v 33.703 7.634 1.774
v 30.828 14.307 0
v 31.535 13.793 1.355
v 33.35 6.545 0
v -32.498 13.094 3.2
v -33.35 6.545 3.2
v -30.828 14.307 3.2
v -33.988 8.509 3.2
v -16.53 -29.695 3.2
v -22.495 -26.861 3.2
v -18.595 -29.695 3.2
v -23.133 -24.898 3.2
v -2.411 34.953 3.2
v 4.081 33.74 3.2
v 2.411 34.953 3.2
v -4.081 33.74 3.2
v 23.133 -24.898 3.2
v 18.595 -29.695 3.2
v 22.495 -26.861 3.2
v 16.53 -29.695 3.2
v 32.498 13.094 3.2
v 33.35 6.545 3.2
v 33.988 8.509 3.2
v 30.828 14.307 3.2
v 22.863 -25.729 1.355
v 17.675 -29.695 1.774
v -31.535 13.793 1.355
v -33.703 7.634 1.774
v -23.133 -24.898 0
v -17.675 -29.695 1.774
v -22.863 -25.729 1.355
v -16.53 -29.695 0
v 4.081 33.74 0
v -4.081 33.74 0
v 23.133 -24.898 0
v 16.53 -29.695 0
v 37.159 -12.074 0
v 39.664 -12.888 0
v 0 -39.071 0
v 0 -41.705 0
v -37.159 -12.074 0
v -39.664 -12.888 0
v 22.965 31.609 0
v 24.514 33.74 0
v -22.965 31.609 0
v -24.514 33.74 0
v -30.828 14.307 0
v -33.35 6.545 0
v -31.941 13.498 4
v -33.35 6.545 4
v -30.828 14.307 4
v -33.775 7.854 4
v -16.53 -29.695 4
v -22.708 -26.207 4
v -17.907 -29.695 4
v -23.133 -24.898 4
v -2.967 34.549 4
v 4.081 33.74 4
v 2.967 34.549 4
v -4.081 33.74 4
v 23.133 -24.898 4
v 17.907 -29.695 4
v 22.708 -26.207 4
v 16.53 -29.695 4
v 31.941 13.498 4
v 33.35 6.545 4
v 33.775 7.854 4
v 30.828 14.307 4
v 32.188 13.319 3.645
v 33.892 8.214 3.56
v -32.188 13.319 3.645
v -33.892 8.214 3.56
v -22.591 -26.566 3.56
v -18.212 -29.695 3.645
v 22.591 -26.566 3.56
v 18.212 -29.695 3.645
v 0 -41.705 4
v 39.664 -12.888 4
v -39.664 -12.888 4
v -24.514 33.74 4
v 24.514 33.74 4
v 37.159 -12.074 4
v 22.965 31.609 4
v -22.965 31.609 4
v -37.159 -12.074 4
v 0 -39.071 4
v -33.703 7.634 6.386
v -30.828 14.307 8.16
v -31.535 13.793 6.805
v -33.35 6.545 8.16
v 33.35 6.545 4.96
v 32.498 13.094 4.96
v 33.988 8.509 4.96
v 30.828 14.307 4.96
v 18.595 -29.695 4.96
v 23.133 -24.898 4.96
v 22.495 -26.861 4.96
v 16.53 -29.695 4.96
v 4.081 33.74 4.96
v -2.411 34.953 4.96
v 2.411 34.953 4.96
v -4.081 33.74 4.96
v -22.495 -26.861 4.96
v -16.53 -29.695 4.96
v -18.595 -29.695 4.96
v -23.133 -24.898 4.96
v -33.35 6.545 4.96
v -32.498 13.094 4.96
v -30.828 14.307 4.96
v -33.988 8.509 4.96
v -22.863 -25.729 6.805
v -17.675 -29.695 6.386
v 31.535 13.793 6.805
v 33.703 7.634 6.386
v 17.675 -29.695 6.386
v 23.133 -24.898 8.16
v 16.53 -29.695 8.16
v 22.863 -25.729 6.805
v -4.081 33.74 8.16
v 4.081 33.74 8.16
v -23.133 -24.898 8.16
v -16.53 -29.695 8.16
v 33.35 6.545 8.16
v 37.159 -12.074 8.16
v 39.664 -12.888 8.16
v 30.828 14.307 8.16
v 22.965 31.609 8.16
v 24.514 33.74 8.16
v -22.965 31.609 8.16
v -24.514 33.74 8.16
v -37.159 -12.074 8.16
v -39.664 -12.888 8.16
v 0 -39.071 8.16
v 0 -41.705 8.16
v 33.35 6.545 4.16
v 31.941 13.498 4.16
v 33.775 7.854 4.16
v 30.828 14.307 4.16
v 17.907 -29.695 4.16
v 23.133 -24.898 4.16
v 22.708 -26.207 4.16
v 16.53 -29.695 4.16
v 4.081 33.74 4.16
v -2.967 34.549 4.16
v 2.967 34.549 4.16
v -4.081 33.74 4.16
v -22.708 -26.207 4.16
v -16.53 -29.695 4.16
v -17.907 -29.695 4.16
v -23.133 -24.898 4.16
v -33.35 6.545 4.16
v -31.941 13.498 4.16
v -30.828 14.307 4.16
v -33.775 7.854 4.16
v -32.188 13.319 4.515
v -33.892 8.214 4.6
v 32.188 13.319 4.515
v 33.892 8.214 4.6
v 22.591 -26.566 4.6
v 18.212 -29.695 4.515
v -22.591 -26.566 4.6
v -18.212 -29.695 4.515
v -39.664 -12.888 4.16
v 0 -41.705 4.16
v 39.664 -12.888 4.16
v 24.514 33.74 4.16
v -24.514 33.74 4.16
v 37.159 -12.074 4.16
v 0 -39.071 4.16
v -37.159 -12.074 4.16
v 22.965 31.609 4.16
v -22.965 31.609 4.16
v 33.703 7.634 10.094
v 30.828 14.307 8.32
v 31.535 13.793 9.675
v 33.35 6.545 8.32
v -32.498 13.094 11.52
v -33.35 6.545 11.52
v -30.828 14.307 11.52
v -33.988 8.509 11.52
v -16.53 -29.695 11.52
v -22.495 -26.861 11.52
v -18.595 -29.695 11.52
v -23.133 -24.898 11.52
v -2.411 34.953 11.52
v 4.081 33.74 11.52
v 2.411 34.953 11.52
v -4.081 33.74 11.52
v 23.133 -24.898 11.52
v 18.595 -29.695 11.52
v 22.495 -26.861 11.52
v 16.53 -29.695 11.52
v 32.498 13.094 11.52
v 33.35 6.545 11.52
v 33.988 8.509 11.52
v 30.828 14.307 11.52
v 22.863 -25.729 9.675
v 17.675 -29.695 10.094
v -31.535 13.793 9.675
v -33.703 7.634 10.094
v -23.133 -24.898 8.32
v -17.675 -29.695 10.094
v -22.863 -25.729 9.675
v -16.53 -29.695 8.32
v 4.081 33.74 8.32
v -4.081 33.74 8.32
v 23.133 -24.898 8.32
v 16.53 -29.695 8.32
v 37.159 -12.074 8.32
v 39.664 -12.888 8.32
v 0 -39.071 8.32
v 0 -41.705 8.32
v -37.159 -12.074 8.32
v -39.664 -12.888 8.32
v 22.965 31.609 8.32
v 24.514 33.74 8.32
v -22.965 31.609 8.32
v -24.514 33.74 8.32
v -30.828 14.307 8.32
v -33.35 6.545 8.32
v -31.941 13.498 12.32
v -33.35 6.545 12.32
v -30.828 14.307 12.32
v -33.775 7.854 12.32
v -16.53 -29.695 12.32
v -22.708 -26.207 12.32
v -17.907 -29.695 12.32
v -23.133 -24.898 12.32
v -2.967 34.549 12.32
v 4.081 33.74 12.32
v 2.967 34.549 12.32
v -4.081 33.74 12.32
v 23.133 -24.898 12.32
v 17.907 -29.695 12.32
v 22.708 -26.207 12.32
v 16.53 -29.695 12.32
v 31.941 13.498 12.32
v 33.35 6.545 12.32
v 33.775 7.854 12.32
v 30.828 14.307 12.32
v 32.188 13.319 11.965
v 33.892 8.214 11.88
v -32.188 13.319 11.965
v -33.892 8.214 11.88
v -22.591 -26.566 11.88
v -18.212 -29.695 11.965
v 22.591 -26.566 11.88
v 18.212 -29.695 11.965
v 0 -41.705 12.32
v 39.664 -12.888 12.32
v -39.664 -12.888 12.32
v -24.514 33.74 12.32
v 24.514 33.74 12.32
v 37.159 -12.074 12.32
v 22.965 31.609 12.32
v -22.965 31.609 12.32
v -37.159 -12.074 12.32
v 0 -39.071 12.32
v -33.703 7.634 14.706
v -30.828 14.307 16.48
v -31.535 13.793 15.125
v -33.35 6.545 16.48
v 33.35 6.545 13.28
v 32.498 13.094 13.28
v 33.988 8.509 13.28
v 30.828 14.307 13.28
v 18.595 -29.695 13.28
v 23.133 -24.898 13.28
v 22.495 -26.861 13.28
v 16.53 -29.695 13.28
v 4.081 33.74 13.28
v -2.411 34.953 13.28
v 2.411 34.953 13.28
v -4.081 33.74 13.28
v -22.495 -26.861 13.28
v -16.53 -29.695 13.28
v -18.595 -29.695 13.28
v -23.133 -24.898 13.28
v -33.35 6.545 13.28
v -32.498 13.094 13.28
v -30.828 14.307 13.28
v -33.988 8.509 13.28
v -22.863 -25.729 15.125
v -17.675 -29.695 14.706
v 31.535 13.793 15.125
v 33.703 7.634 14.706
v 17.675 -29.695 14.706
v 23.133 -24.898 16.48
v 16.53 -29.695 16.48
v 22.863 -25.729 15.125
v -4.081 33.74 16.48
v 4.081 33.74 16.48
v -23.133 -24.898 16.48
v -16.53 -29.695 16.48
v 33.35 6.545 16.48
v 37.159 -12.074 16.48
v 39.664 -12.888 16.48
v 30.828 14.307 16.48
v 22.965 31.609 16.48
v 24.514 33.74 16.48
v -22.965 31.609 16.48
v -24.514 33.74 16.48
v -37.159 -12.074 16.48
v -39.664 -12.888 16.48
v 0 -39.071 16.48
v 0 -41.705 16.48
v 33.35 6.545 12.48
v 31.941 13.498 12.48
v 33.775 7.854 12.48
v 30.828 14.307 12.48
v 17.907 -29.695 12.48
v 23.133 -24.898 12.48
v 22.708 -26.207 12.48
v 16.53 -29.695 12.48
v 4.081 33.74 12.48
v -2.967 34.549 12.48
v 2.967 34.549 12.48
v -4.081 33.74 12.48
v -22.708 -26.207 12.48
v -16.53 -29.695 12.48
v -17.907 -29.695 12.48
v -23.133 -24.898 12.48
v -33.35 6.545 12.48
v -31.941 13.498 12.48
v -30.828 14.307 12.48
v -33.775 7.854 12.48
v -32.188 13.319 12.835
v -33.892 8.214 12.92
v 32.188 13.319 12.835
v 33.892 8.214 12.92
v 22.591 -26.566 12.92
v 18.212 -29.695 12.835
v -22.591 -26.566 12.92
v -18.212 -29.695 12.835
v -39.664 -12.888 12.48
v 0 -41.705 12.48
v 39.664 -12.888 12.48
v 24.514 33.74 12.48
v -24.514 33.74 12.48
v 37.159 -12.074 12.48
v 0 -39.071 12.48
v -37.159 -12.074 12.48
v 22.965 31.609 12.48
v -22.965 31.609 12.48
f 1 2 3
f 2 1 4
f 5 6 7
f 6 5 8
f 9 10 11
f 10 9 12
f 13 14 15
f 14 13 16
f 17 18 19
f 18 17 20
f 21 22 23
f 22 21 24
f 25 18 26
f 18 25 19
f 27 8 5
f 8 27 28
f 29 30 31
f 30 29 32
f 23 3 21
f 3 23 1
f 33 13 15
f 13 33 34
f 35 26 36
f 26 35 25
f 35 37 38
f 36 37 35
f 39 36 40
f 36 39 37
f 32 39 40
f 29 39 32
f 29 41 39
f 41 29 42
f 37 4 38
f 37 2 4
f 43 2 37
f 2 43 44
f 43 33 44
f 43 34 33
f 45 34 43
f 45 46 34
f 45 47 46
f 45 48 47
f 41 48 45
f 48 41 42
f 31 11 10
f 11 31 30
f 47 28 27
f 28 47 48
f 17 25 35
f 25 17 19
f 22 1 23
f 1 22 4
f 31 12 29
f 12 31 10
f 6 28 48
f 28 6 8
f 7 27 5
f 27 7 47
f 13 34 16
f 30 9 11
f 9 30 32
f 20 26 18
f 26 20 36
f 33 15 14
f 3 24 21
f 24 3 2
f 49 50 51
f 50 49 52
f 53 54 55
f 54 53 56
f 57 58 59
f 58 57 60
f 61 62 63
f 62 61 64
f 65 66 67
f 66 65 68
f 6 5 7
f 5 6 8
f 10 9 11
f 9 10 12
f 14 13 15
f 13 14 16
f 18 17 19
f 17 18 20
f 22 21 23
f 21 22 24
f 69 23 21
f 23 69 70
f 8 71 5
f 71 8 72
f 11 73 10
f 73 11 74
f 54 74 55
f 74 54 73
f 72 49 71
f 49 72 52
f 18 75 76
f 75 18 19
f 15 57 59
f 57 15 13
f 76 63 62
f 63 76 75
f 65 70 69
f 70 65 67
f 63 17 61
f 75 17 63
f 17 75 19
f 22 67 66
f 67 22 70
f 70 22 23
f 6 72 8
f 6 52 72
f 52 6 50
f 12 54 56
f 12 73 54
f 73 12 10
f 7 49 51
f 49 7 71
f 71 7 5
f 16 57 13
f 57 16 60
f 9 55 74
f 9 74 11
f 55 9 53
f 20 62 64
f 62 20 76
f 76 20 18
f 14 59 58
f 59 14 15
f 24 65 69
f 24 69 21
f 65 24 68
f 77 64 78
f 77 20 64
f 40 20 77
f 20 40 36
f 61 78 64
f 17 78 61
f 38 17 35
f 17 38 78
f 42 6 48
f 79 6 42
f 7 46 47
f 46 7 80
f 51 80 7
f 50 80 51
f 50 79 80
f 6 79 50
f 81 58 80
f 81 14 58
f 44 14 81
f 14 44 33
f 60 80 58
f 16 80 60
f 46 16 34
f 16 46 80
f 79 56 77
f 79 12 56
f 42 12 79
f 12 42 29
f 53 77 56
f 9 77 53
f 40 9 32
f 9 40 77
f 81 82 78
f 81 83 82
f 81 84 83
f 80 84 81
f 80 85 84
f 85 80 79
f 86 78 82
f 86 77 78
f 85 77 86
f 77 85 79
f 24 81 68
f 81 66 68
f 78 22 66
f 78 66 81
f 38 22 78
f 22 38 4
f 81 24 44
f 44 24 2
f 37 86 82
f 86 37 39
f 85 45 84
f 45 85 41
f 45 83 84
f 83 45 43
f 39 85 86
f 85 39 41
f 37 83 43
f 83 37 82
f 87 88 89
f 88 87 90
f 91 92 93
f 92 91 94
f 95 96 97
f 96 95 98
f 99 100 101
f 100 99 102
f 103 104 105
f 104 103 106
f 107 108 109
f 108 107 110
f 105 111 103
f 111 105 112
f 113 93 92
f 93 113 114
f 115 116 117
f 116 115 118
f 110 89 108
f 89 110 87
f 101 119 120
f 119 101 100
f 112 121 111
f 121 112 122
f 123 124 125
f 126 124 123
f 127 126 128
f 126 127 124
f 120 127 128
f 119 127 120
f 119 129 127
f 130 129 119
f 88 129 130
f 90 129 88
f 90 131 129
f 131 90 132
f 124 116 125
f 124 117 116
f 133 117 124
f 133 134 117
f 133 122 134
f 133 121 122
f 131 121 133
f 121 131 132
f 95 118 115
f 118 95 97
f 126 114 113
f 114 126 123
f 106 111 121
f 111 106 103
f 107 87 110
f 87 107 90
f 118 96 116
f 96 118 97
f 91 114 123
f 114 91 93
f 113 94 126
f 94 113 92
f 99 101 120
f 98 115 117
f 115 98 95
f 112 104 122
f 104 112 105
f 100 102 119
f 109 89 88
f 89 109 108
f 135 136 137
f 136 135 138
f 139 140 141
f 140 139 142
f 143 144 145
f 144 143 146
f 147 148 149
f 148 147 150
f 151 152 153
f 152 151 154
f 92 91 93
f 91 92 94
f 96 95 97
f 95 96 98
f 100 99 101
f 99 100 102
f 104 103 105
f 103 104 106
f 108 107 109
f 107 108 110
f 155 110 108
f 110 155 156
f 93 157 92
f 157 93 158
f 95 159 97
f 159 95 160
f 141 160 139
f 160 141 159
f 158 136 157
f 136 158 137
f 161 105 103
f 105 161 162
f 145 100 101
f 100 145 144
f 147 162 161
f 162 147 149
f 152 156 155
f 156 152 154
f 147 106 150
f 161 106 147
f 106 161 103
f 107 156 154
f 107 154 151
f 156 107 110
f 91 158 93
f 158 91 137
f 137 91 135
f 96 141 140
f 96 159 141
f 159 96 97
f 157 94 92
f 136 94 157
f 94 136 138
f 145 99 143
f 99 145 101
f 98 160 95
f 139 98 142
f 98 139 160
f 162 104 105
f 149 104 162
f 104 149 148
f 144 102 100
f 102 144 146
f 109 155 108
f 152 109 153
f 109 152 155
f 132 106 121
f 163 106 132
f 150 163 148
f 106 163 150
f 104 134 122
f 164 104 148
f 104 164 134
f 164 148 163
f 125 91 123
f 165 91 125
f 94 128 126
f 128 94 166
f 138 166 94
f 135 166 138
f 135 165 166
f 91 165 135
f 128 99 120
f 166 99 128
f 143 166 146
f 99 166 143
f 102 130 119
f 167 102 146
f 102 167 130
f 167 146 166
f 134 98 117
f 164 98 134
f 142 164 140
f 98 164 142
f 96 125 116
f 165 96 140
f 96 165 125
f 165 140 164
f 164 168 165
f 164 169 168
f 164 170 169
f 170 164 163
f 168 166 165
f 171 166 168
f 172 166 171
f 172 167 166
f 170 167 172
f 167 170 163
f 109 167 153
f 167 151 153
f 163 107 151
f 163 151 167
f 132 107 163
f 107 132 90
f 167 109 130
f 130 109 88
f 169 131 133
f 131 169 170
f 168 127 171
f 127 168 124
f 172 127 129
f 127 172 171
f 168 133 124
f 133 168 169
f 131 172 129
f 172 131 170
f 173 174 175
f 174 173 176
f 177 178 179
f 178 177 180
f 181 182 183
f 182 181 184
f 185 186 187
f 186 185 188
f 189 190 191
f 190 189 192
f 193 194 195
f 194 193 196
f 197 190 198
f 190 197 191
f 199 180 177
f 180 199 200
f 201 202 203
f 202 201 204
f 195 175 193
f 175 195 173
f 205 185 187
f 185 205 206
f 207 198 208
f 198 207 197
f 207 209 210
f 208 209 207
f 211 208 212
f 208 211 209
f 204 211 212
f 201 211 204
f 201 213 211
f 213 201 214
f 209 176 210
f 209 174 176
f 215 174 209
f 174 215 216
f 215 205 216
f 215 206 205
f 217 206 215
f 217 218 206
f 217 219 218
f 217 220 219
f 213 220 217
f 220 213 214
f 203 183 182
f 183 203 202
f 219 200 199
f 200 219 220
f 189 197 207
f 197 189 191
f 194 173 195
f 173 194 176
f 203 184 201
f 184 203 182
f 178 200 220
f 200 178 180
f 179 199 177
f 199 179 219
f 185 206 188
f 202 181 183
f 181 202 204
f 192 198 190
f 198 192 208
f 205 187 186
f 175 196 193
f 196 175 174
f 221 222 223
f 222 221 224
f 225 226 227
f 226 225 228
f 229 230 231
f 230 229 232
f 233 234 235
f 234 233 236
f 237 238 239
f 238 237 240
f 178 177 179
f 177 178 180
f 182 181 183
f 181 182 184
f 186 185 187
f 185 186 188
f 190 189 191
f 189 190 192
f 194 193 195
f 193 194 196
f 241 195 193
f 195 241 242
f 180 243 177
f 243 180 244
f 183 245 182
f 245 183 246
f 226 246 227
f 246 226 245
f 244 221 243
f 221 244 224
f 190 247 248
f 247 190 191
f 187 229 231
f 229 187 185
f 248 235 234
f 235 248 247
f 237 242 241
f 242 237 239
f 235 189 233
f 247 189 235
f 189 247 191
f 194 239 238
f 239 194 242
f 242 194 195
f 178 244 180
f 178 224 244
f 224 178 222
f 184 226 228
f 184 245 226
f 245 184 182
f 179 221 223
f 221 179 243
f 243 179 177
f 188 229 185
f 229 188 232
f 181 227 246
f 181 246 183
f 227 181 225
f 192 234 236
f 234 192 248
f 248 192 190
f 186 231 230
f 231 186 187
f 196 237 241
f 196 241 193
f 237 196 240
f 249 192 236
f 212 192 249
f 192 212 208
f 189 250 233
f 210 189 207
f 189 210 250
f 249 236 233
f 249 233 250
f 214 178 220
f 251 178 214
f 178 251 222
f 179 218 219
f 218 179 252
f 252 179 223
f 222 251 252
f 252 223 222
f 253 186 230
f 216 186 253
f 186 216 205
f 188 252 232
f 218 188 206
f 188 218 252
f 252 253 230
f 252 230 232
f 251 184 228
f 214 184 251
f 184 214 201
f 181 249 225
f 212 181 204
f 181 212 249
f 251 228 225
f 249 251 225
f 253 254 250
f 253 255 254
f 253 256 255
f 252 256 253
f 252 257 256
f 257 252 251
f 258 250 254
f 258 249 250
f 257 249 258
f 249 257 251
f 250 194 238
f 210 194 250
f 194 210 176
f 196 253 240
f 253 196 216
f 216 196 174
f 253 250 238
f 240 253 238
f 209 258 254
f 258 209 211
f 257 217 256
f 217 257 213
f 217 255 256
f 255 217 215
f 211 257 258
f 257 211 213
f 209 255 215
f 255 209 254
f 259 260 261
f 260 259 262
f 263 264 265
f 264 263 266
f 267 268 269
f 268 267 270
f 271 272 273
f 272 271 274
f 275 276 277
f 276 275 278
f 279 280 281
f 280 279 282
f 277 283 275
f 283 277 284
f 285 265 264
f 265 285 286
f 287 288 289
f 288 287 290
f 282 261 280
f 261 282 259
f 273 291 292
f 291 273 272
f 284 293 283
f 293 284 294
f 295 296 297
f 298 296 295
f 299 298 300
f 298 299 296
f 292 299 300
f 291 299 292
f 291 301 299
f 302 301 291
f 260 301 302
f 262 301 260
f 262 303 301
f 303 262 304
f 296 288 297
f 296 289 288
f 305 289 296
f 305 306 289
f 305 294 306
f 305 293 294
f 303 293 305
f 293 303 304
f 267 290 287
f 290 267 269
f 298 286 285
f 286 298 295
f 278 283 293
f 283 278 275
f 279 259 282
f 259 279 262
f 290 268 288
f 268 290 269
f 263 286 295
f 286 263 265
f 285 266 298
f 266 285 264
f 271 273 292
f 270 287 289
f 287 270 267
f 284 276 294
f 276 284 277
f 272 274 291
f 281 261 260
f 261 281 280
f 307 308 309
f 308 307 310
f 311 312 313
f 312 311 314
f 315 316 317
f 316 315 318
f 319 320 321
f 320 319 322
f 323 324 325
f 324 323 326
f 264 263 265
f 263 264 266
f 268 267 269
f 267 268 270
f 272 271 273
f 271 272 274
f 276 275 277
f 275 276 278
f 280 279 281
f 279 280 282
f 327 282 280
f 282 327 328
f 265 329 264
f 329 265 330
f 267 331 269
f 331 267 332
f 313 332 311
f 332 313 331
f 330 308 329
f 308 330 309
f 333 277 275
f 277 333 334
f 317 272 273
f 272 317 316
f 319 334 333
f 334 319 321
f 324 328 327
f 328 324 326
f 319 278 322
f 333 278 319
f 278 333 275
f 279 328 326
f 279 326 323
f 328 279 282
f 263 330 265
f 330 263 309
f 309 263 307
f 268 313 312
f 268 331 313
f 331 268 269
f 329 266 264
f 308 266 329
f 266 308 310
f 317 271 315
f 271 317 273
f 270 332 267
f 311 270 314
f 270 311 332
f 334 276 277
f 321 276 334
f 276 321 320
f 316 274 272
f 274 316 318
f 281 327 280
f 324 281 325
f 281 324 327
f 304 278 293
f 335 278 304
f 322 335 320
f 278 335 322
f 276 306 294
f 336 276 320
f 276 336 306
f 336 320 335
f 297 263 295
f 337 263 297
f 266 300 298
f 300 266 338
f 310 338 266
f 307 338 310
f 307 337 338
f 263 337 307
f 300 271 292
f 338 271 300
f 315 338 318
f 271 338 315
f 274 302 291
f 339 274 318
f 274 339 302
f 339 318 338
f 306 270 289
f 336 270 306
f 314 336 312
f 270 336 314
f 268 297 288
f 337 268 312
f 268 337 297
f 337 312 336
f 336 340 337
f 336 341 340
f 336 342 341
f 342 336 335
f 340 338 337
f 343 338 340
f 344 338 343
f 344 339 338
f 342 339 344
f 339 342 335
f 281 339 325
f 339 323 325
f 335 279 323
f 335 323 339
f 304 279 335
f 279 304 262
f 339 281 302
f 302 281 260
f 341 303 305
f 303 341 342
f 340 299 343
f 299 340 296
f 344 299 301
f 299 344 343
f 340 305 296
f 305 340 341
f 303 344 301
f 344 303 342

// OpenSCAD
hauteurExt = 111.352;
epaisseurParoi = 1;
diametreTrouBouchon = 1.6;
facettesPied = 99;
r = 0.19; // résolution d'impression sur l'axe Z
echelleReductionAjustementBouchon = 0.985;
hauteurInt = hauteurExt - 2 * epaisseurParoi;
clipRadius = hauteurExt/2.67;
epaisseur = 1.5;

//dode_creux();
//decoupe_bouchon();
// corps_ouvert();
// piedE27();
//piedE14();

// Modif : Ajout pentagone à coller sur les pieds déjà imprimés
pentagone();
translate([0,0,8+0.16]) rotate([0,0,180]) rotate([180,0]) pentagone();
translate([0,0,8+2*0.16]) pentagone();
translate([0,0,16+3*0.16]) rotate([0,0,180]) rotate([180,0]) pentagone();
module pentagone() {
    distance = hauteurExt/2;
    hauteur = 4;
    rmax = clipRadius + 1.5;
    // translate([0,0,distance-2*epaisseur-hauteur])
    difference() {
        union() {
            rotate([0,0,54])
                cylinder(hauteur, r=clipRadius, $fn=5);
            // clip
            intersection() {
                rotate([0,0,54])
                    cylinder(hauteur*0.8, r1=clipRadius, r2=rmax, $fn=5);
                rotate([0,0,54+72/2])
                    cylinder(hauteur*0.8, r=clipRadius-5, $fn=5);
            }
            translate([0,0,hauteur*0.8])
            intersection() {
                rotate([0,0,54])
                    cylinder(hauteur*0.2, r1=rmax, r2=clipRadius+1, $fn=5);
                rotate([0,0,54+72/2])
                    cylinder(hauteur*0.2, r=clipRadius-5, $fn=5);
            }
        }
        rotate([0,0,54])
            cylinder(4, r=hauteurExt/2.85, $fn=5);
    }
}

module corps_ouvert() {
	difference() {
		dode_creux();
		decoupe_bouchon();
	}
}



module piedE27() {
    pied(diamTrou=42);
}
module piedE14() {
    pied(diamTrou=30);
}

module pied(diamTrou) {
    distance = hauteurExt/2;
    difference() {
        union() {
            // fermeture (face) dodécaèdre
            rotate([0,0,54]) translate([0,0,distance-epaisseur])
                cylinder(epaisseur, r=hauteurExt/2.563, r2=hauteurExt/2.618, $fn=5);
            // Feuillure
                rotate([0,0,54]) translate([0,0,distance-2*epaisseur])
                    cylinder(epaisseur, r=hauteurExt/2.67, r2=hauteurExt/2.66, $fn=5);
            // clip
            translate([0,0,distance-2*epaisseur])
            intersection() {
                rotate([0,0,54])
                    cylinder(epaisseur, r1=clipRadius+1, r2=clipRadius+0.1, $fn=5);
                rotate([0,0,54+72/2])
                    cylinder(epaisseur, r=clipRadius-5, $fn=5);
            }
        }
        union() {
            // Trou douille
            rotate([0,0,54]) translate([0,0,distance-2*epaisseur])
                cylinder(2*epaisseur+0.2, r=diamTrou/2, $fn=50);
            // ouvertures
//            for (i = [1:5]) {
//              rotate([0, 0, 360/5*i])
//                translate([0, 0, distance-epaisseur-10]) rotate([0,0,0])
//                  decoupe_demi_cercle();
//            }
        }
    }

    // base pied
    difference() {
        dhaut = 50;
        dbas = 88;
        rotate([0,0,54]) translate([0,0,distance])
            cylinder(56, d1=dhaut, d2=dbas, $fn=facettesPied);
        rotate([0,0,54]) translate([0,0,distance])
            cylinder(56, d1=dhaut-3, d2=dbas-3, $fn=facettesPied);
        // Passe fil
        translate([0,0,distance+48]) rotate([0,90,18])
            cylinder(120, r=3.5, $fn=20);
    }
}
//decoupe_demi_cercle();
module decoupe_demi_cercle() {
    translate([0,58,0])
    difference() {
      linear_extrude(height = 30)
        circle(28, $fn=55);
        translate([0,25,0])
        cube(80, center=true);
    }
}

module dode_creux() {
	difference() {
		dodecahedron(hauteurExt);
		dodecahedron(hauteurInt);
	}
}

module decoupe_bouchon() {
    distance = hauteurInt/2+4*r;
//	rotate([0,0,54]) translate([0,0,distance])
//		cylinder(epaisseurParoi, r=hauteurExt/2.675, $fn=5);
	rotate([0,0,54]) translate([0,0,hauteurExt/2-epaisseur+0])
		cylinder(epaisseur+0.01, r=hauteurExt/2.5, $fn=5);
}

module dodecahedron(height) {
	scale([height,height,height]) {
		intersection() {
			cube([2,2,1], center = true);
			intersection_for(i=[0:4]) {
				rotate([0,0,72*i])
				rotate([116.565,0,0])
					cube([2,2,1], center = true);
			}
		}
	}
}
